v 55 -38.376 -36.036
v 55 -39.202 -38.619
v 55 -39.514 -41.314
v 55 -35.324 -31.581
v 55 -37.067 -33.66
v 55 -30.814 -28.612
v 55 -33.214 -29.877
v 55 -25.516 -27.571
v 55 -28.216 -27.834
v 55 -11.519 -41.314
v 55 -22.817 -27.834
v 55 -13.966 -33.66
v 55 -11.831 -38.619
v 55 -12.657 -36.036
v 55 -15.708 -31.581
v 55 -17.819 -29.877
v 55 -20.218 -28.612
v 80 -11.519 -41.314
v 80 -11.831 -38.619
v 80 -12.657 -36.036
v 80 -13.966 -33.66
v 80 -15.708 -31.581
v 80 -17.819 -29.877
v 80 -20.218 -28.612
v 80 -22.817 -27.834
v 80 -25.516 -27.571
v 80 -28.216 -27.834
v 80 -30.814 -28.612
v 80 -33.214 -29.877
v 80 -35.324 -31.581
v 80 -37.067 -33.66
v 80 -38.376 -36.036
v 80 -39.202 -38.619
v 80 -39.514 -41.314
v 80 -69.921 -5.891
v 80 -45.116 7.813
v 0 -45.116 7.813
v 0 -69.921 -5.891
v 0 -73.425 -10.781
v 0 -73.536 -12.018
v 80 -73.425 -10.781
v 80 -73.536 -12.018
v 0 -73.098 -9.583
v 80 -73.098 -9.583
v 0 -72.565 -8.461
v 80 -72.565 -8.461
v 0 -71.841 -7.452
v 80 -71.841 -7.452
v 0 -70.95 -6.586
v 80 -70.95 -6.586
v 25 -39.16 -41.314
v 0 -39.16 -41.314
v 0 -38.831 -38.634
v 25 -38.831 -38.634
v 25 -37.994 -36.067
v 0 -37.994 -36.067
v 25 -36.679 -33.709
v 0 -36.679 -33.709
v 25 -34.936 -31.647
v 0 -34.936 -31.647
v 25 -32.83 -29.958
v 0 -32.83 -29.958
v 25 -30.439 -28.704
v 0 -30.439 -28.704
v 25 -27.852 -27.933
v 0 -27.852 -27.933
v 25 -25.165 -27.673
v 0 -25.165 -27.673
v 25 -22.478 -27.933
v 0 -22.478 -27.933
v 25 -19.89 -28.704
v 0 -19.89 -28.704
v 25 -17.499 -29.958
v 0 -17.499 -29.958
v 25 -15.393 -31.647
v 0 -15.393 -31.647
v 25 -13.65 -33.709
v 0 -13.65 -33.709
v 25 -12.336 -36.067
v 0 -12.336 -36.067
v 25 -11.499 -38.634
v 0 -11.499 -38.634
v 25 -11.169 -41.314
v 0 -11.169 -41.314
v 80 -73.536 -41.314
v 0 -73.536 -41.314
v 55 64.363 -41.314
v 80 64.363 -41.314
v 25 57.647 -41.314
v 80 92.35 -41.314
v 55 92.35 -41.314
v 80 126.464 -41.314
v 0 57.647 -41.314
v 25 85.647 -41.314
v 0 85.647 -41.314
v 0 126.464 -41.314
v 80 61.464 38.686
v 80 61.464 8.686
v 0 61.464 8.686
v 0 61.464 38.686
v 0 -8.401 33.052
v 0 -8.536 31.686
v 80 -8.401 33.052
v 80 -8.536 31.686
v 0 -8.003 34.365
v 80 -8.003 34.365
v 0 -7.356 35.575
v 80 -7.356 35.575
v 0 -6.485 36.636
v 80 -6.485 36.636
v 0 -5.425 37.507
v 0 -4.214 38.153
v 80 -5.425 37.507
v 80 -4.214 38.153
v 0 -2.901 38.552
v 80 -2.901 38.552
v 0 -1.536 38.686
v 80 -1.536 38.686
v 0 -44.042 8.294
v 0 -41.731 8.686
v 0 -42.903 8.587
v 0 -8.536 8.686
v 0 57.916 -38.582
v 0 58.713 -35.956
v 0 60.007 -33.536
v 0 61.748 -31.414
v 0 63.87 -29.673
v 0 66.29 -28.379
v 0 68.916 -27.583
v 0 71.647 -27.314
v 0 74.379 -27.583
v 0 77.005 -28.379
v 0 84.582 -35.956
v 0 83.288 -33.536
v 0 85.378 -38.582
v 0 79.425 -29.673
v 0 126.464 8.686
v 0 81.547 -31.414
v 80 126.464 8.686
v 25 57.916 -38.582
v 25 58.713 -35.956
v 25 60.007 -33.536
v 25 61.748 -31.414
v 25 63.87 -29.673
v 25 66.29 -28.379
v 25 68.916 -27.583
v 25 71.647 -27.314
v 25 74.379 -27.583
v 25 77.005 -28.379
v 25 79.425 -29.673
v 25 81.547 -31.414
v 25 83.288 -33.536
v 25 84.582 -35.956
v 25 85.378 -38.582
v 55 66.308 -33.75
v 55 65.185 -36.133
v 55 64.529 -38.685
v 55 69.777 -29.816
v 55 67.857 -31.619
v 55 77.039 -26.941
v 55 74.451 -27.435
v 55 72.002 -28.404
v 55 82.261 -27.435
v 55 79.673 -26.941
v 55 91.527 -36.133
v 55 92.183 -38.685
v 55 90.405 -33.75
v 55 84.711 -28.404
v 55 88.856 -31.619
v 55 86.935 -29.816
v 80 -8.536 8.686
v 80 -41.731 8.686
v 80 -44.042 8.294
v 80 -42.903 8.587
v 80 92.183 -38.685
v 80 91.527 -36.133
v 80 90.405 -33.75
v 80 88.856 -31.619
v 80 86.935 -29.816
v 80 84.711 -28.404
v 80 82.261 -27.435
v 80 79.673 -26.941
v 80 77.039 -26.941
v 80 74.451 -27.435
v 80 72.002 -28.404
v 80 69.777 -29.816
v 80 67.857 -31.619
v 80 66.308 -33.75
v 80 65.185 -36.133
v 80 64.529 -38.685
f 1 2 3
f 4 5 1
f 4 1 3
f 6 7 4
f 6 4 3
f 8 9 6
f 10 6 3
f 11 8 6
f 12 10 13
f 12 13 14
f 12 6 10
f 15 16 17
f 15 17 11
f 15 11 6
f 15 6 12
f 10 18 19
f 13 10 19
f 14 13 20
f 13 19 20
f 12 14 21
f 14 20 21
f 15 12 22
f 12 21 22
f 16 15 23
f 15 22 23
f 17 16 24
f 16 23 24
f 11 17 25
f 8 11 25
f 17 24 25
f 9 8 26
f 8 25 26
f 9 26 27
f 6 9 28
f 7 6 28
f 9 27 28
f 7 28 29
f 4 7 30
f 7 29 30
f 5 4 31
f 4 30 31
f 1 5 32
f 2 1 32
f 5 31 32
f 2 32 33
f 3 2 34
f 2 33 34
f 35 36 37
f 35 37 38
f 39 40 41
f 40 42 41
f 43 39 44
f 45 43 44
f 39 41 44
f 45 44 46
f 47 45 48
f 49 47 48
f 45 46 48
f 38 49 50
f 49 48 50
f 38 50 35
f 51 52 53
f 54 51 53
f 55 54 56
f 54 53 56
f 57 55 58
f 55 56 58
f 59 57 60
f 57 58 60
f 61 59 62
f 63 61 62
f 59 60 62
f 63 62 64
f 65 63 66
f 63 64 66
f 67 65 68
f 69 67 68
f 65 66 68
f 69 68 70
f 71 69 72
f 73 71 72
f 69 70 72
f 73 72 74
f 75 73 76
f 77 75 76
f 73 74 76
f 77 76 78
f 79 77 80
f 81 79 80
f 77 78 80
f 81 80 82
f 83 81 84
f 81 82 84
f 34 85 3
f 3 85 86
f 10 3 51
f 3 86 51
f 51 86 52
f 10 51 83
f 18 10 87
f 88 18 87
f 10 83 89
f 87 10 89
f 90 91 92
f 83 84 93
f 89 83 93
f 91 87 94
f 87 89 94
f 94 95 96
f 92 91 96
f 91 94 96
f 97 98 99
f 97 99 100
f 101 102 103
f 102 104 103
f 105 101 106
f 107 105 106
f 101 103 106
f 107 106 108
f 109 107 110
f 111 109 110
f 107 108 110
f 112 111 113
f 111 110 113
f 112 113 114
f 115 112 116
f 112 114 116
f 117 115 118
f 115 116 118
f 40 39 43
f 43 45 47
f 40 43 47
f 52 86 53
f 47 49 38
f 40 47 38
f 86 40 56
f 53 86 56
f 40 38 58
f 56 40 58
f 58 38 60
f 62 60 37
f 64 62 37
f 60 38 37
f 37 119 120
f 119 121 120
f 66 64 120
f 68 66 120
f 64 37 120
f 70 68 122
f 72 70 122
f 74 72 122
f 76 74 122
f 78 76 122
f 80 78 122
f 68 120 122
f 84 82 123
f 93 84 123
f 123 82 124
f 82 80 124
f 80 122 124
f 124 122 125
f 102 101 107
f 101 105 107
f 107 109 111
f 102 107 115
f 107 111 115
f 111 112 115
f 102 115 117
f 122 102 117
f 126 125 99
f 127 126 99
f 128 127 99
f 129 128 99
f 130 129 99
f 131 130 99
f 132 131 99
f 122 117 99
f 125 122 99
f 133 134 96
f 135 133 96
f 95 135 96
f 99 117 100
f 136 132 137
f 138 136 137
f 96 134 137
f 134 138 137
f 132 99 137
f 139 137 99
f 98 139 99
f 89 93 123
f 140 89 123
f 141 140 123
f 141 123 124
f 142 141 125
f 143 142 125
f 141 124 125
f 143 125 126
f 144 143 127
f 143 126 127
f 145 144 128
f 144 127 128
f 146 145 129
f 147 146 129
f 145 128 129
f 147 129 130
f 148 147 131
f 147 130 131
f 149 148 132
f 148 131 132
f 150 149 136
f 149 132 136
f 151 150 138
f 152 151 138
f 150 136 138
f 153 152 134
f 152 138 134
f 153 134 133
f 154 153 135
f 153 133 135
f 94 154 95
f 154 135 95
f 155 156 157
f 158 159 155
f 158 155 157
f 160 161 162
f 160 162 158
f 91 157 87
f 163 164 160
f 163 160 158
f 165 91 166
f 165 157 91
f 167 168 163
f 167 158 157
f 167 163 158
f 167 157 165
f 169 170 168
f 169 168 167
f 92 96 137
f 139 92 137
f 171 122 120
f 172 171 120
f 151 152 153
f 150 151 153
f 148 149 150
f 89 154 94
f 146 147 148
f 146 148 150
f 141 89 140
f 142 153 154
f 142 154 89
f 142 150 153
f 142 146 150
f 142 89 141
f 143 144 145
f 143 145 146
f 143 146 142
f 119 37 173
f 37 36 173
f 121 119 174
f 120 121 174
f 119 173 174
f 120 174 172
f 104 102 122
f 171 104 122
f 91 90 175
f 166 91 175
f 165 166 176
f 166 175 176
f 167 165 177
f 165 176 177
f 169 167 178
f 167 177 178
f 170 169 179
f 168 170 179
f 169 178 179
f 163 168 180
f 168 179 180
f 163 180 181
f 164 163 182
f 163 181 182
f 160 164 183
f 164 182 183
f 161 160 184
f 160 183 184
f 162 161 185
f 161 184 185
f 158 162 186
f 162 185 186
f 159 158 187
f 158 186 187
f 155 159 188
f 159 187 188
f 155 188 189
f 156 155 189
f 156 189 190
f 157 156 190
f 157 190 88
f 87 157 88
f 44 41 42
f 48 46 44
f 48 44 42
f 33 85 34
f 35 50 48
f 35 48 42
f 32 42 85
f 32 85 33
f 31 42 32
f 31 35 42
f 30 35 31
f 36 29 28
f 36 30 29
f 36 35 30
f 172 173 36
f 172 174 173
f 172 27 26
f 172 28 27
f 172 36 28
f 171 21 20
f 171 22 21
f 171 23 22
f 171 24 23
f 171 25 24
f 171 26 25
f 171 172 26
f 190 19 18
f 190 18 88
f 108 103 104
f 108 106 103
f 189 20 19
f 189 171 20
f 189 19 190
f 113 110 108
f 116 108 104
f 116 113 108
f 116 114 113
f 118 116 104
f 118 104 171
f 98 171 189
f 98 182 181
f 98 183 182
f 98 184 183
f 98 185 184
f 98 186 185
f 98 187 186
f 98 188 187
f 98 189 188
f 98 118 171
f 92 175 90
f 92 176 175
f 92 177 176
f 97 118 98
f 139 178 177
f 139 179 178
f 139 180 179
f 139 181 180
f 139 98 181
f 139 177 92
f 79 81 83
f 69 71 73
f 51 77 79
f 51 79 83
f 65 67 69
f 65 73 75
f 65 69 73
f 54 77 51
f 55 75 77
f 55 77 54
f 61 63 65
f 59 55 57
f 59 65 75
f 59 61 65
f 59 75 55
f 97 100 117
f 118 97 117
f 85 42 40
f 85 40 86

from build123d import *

# Parameters (mm, degrees)
F1_DEPTH = 80
F4_DEPTH = 25
F6_DEPTH = 25
F7_DEPTH = 25
F9_DEPTH = 25
F10_R    = 7


with BuildPart() as f1:
    # F0 (on Right) → F1 (new body)
    with BuildSketch(Plane.YZ):
        Polygon((-73.535658, -7.88837), (-73.535658, -41.313667), (126.464342, -41.313667), (126.464342, 8.686333), (61.464342, 8.686333), (61.464342, 38.686333), (-8.535658, 38.686333), (-8.535658, 8.686333), (-43.535658, 8.686333), align=None)
    extrude(amount=F1_DEPTH)

    # F3 (on face) → F4 (cut)
    with BuildSketch(Plane(origin=(0, 0, 0), x_dir=(0, -1, 0), z_dir=(-1, 0, 0))):
        with BuildLine():
            Line((11.169364, -41.313667), (39.16015, -41.313667))
            ThreePointArc((39.16015, -41.313667), (25.164757, -27.672787), (11.169364, -41.313667))
        make_face()
    extrude(amount=-F4_DEPTH, mode=Mode.SUBTRACT)

    # F5 (on face) → F6 (cut)
    with BuildSketch(Plane(origin=(0, 0, 0), x_dir=(0, -1, 0), z_dir=(-1, 0, 0))):
        with BuildLine():
            Line((-85.647489, -41.313667), (-57.647489, -41.313667))
            ThreePointArc((-57.647489, -41.313667), (-71.647489, -27.313667), (-85.647489, -41.313667))
        make_face()
    extrude(amount=-F6_DEPTH, mode=Mode.SUBTRACT)

    # F2 (on face) → F7 (cut)
    with BuildSketch(Plane.YZ.offset(80)):
        with BuildLine():
            Line((-39.514016, -41.313667), (-11.518752, -41.313667))
            ThreePointArc((-11.518752, -41.313667), (-25.516384, -27.571131), (-39.514016, -41.313667))
        make_face()
    extrude(amount=-F7_DEPTH, mode=Mode.SUBTRACT)

    # F8 (on face) → F9 (cut)
    with BuildSketch(Plane.YZ.offset(80)):
        with BuildLine():
            Line((64.363025, -41.313667), (92.349545, -41.313667))
            ThreePointArc((92.349545, -41.313667), (78.356285, -26.879303), (64.363025, -41.313667))
        make_face()
    extrude(amount=-F9_DEPTH, mode=Mode.SUBTRACT)

    # F10
    f10_edges = [f1.edges().sort_by_distance(p)[0] for p in [
        (40, -8.535658, 38.686333),
        (40, -73.535658, -7.88837),
        (40, -43.535658, 8.686333),
    ]]
    fillet(f10_edges, radius=F10_R)


solid = f1.part
